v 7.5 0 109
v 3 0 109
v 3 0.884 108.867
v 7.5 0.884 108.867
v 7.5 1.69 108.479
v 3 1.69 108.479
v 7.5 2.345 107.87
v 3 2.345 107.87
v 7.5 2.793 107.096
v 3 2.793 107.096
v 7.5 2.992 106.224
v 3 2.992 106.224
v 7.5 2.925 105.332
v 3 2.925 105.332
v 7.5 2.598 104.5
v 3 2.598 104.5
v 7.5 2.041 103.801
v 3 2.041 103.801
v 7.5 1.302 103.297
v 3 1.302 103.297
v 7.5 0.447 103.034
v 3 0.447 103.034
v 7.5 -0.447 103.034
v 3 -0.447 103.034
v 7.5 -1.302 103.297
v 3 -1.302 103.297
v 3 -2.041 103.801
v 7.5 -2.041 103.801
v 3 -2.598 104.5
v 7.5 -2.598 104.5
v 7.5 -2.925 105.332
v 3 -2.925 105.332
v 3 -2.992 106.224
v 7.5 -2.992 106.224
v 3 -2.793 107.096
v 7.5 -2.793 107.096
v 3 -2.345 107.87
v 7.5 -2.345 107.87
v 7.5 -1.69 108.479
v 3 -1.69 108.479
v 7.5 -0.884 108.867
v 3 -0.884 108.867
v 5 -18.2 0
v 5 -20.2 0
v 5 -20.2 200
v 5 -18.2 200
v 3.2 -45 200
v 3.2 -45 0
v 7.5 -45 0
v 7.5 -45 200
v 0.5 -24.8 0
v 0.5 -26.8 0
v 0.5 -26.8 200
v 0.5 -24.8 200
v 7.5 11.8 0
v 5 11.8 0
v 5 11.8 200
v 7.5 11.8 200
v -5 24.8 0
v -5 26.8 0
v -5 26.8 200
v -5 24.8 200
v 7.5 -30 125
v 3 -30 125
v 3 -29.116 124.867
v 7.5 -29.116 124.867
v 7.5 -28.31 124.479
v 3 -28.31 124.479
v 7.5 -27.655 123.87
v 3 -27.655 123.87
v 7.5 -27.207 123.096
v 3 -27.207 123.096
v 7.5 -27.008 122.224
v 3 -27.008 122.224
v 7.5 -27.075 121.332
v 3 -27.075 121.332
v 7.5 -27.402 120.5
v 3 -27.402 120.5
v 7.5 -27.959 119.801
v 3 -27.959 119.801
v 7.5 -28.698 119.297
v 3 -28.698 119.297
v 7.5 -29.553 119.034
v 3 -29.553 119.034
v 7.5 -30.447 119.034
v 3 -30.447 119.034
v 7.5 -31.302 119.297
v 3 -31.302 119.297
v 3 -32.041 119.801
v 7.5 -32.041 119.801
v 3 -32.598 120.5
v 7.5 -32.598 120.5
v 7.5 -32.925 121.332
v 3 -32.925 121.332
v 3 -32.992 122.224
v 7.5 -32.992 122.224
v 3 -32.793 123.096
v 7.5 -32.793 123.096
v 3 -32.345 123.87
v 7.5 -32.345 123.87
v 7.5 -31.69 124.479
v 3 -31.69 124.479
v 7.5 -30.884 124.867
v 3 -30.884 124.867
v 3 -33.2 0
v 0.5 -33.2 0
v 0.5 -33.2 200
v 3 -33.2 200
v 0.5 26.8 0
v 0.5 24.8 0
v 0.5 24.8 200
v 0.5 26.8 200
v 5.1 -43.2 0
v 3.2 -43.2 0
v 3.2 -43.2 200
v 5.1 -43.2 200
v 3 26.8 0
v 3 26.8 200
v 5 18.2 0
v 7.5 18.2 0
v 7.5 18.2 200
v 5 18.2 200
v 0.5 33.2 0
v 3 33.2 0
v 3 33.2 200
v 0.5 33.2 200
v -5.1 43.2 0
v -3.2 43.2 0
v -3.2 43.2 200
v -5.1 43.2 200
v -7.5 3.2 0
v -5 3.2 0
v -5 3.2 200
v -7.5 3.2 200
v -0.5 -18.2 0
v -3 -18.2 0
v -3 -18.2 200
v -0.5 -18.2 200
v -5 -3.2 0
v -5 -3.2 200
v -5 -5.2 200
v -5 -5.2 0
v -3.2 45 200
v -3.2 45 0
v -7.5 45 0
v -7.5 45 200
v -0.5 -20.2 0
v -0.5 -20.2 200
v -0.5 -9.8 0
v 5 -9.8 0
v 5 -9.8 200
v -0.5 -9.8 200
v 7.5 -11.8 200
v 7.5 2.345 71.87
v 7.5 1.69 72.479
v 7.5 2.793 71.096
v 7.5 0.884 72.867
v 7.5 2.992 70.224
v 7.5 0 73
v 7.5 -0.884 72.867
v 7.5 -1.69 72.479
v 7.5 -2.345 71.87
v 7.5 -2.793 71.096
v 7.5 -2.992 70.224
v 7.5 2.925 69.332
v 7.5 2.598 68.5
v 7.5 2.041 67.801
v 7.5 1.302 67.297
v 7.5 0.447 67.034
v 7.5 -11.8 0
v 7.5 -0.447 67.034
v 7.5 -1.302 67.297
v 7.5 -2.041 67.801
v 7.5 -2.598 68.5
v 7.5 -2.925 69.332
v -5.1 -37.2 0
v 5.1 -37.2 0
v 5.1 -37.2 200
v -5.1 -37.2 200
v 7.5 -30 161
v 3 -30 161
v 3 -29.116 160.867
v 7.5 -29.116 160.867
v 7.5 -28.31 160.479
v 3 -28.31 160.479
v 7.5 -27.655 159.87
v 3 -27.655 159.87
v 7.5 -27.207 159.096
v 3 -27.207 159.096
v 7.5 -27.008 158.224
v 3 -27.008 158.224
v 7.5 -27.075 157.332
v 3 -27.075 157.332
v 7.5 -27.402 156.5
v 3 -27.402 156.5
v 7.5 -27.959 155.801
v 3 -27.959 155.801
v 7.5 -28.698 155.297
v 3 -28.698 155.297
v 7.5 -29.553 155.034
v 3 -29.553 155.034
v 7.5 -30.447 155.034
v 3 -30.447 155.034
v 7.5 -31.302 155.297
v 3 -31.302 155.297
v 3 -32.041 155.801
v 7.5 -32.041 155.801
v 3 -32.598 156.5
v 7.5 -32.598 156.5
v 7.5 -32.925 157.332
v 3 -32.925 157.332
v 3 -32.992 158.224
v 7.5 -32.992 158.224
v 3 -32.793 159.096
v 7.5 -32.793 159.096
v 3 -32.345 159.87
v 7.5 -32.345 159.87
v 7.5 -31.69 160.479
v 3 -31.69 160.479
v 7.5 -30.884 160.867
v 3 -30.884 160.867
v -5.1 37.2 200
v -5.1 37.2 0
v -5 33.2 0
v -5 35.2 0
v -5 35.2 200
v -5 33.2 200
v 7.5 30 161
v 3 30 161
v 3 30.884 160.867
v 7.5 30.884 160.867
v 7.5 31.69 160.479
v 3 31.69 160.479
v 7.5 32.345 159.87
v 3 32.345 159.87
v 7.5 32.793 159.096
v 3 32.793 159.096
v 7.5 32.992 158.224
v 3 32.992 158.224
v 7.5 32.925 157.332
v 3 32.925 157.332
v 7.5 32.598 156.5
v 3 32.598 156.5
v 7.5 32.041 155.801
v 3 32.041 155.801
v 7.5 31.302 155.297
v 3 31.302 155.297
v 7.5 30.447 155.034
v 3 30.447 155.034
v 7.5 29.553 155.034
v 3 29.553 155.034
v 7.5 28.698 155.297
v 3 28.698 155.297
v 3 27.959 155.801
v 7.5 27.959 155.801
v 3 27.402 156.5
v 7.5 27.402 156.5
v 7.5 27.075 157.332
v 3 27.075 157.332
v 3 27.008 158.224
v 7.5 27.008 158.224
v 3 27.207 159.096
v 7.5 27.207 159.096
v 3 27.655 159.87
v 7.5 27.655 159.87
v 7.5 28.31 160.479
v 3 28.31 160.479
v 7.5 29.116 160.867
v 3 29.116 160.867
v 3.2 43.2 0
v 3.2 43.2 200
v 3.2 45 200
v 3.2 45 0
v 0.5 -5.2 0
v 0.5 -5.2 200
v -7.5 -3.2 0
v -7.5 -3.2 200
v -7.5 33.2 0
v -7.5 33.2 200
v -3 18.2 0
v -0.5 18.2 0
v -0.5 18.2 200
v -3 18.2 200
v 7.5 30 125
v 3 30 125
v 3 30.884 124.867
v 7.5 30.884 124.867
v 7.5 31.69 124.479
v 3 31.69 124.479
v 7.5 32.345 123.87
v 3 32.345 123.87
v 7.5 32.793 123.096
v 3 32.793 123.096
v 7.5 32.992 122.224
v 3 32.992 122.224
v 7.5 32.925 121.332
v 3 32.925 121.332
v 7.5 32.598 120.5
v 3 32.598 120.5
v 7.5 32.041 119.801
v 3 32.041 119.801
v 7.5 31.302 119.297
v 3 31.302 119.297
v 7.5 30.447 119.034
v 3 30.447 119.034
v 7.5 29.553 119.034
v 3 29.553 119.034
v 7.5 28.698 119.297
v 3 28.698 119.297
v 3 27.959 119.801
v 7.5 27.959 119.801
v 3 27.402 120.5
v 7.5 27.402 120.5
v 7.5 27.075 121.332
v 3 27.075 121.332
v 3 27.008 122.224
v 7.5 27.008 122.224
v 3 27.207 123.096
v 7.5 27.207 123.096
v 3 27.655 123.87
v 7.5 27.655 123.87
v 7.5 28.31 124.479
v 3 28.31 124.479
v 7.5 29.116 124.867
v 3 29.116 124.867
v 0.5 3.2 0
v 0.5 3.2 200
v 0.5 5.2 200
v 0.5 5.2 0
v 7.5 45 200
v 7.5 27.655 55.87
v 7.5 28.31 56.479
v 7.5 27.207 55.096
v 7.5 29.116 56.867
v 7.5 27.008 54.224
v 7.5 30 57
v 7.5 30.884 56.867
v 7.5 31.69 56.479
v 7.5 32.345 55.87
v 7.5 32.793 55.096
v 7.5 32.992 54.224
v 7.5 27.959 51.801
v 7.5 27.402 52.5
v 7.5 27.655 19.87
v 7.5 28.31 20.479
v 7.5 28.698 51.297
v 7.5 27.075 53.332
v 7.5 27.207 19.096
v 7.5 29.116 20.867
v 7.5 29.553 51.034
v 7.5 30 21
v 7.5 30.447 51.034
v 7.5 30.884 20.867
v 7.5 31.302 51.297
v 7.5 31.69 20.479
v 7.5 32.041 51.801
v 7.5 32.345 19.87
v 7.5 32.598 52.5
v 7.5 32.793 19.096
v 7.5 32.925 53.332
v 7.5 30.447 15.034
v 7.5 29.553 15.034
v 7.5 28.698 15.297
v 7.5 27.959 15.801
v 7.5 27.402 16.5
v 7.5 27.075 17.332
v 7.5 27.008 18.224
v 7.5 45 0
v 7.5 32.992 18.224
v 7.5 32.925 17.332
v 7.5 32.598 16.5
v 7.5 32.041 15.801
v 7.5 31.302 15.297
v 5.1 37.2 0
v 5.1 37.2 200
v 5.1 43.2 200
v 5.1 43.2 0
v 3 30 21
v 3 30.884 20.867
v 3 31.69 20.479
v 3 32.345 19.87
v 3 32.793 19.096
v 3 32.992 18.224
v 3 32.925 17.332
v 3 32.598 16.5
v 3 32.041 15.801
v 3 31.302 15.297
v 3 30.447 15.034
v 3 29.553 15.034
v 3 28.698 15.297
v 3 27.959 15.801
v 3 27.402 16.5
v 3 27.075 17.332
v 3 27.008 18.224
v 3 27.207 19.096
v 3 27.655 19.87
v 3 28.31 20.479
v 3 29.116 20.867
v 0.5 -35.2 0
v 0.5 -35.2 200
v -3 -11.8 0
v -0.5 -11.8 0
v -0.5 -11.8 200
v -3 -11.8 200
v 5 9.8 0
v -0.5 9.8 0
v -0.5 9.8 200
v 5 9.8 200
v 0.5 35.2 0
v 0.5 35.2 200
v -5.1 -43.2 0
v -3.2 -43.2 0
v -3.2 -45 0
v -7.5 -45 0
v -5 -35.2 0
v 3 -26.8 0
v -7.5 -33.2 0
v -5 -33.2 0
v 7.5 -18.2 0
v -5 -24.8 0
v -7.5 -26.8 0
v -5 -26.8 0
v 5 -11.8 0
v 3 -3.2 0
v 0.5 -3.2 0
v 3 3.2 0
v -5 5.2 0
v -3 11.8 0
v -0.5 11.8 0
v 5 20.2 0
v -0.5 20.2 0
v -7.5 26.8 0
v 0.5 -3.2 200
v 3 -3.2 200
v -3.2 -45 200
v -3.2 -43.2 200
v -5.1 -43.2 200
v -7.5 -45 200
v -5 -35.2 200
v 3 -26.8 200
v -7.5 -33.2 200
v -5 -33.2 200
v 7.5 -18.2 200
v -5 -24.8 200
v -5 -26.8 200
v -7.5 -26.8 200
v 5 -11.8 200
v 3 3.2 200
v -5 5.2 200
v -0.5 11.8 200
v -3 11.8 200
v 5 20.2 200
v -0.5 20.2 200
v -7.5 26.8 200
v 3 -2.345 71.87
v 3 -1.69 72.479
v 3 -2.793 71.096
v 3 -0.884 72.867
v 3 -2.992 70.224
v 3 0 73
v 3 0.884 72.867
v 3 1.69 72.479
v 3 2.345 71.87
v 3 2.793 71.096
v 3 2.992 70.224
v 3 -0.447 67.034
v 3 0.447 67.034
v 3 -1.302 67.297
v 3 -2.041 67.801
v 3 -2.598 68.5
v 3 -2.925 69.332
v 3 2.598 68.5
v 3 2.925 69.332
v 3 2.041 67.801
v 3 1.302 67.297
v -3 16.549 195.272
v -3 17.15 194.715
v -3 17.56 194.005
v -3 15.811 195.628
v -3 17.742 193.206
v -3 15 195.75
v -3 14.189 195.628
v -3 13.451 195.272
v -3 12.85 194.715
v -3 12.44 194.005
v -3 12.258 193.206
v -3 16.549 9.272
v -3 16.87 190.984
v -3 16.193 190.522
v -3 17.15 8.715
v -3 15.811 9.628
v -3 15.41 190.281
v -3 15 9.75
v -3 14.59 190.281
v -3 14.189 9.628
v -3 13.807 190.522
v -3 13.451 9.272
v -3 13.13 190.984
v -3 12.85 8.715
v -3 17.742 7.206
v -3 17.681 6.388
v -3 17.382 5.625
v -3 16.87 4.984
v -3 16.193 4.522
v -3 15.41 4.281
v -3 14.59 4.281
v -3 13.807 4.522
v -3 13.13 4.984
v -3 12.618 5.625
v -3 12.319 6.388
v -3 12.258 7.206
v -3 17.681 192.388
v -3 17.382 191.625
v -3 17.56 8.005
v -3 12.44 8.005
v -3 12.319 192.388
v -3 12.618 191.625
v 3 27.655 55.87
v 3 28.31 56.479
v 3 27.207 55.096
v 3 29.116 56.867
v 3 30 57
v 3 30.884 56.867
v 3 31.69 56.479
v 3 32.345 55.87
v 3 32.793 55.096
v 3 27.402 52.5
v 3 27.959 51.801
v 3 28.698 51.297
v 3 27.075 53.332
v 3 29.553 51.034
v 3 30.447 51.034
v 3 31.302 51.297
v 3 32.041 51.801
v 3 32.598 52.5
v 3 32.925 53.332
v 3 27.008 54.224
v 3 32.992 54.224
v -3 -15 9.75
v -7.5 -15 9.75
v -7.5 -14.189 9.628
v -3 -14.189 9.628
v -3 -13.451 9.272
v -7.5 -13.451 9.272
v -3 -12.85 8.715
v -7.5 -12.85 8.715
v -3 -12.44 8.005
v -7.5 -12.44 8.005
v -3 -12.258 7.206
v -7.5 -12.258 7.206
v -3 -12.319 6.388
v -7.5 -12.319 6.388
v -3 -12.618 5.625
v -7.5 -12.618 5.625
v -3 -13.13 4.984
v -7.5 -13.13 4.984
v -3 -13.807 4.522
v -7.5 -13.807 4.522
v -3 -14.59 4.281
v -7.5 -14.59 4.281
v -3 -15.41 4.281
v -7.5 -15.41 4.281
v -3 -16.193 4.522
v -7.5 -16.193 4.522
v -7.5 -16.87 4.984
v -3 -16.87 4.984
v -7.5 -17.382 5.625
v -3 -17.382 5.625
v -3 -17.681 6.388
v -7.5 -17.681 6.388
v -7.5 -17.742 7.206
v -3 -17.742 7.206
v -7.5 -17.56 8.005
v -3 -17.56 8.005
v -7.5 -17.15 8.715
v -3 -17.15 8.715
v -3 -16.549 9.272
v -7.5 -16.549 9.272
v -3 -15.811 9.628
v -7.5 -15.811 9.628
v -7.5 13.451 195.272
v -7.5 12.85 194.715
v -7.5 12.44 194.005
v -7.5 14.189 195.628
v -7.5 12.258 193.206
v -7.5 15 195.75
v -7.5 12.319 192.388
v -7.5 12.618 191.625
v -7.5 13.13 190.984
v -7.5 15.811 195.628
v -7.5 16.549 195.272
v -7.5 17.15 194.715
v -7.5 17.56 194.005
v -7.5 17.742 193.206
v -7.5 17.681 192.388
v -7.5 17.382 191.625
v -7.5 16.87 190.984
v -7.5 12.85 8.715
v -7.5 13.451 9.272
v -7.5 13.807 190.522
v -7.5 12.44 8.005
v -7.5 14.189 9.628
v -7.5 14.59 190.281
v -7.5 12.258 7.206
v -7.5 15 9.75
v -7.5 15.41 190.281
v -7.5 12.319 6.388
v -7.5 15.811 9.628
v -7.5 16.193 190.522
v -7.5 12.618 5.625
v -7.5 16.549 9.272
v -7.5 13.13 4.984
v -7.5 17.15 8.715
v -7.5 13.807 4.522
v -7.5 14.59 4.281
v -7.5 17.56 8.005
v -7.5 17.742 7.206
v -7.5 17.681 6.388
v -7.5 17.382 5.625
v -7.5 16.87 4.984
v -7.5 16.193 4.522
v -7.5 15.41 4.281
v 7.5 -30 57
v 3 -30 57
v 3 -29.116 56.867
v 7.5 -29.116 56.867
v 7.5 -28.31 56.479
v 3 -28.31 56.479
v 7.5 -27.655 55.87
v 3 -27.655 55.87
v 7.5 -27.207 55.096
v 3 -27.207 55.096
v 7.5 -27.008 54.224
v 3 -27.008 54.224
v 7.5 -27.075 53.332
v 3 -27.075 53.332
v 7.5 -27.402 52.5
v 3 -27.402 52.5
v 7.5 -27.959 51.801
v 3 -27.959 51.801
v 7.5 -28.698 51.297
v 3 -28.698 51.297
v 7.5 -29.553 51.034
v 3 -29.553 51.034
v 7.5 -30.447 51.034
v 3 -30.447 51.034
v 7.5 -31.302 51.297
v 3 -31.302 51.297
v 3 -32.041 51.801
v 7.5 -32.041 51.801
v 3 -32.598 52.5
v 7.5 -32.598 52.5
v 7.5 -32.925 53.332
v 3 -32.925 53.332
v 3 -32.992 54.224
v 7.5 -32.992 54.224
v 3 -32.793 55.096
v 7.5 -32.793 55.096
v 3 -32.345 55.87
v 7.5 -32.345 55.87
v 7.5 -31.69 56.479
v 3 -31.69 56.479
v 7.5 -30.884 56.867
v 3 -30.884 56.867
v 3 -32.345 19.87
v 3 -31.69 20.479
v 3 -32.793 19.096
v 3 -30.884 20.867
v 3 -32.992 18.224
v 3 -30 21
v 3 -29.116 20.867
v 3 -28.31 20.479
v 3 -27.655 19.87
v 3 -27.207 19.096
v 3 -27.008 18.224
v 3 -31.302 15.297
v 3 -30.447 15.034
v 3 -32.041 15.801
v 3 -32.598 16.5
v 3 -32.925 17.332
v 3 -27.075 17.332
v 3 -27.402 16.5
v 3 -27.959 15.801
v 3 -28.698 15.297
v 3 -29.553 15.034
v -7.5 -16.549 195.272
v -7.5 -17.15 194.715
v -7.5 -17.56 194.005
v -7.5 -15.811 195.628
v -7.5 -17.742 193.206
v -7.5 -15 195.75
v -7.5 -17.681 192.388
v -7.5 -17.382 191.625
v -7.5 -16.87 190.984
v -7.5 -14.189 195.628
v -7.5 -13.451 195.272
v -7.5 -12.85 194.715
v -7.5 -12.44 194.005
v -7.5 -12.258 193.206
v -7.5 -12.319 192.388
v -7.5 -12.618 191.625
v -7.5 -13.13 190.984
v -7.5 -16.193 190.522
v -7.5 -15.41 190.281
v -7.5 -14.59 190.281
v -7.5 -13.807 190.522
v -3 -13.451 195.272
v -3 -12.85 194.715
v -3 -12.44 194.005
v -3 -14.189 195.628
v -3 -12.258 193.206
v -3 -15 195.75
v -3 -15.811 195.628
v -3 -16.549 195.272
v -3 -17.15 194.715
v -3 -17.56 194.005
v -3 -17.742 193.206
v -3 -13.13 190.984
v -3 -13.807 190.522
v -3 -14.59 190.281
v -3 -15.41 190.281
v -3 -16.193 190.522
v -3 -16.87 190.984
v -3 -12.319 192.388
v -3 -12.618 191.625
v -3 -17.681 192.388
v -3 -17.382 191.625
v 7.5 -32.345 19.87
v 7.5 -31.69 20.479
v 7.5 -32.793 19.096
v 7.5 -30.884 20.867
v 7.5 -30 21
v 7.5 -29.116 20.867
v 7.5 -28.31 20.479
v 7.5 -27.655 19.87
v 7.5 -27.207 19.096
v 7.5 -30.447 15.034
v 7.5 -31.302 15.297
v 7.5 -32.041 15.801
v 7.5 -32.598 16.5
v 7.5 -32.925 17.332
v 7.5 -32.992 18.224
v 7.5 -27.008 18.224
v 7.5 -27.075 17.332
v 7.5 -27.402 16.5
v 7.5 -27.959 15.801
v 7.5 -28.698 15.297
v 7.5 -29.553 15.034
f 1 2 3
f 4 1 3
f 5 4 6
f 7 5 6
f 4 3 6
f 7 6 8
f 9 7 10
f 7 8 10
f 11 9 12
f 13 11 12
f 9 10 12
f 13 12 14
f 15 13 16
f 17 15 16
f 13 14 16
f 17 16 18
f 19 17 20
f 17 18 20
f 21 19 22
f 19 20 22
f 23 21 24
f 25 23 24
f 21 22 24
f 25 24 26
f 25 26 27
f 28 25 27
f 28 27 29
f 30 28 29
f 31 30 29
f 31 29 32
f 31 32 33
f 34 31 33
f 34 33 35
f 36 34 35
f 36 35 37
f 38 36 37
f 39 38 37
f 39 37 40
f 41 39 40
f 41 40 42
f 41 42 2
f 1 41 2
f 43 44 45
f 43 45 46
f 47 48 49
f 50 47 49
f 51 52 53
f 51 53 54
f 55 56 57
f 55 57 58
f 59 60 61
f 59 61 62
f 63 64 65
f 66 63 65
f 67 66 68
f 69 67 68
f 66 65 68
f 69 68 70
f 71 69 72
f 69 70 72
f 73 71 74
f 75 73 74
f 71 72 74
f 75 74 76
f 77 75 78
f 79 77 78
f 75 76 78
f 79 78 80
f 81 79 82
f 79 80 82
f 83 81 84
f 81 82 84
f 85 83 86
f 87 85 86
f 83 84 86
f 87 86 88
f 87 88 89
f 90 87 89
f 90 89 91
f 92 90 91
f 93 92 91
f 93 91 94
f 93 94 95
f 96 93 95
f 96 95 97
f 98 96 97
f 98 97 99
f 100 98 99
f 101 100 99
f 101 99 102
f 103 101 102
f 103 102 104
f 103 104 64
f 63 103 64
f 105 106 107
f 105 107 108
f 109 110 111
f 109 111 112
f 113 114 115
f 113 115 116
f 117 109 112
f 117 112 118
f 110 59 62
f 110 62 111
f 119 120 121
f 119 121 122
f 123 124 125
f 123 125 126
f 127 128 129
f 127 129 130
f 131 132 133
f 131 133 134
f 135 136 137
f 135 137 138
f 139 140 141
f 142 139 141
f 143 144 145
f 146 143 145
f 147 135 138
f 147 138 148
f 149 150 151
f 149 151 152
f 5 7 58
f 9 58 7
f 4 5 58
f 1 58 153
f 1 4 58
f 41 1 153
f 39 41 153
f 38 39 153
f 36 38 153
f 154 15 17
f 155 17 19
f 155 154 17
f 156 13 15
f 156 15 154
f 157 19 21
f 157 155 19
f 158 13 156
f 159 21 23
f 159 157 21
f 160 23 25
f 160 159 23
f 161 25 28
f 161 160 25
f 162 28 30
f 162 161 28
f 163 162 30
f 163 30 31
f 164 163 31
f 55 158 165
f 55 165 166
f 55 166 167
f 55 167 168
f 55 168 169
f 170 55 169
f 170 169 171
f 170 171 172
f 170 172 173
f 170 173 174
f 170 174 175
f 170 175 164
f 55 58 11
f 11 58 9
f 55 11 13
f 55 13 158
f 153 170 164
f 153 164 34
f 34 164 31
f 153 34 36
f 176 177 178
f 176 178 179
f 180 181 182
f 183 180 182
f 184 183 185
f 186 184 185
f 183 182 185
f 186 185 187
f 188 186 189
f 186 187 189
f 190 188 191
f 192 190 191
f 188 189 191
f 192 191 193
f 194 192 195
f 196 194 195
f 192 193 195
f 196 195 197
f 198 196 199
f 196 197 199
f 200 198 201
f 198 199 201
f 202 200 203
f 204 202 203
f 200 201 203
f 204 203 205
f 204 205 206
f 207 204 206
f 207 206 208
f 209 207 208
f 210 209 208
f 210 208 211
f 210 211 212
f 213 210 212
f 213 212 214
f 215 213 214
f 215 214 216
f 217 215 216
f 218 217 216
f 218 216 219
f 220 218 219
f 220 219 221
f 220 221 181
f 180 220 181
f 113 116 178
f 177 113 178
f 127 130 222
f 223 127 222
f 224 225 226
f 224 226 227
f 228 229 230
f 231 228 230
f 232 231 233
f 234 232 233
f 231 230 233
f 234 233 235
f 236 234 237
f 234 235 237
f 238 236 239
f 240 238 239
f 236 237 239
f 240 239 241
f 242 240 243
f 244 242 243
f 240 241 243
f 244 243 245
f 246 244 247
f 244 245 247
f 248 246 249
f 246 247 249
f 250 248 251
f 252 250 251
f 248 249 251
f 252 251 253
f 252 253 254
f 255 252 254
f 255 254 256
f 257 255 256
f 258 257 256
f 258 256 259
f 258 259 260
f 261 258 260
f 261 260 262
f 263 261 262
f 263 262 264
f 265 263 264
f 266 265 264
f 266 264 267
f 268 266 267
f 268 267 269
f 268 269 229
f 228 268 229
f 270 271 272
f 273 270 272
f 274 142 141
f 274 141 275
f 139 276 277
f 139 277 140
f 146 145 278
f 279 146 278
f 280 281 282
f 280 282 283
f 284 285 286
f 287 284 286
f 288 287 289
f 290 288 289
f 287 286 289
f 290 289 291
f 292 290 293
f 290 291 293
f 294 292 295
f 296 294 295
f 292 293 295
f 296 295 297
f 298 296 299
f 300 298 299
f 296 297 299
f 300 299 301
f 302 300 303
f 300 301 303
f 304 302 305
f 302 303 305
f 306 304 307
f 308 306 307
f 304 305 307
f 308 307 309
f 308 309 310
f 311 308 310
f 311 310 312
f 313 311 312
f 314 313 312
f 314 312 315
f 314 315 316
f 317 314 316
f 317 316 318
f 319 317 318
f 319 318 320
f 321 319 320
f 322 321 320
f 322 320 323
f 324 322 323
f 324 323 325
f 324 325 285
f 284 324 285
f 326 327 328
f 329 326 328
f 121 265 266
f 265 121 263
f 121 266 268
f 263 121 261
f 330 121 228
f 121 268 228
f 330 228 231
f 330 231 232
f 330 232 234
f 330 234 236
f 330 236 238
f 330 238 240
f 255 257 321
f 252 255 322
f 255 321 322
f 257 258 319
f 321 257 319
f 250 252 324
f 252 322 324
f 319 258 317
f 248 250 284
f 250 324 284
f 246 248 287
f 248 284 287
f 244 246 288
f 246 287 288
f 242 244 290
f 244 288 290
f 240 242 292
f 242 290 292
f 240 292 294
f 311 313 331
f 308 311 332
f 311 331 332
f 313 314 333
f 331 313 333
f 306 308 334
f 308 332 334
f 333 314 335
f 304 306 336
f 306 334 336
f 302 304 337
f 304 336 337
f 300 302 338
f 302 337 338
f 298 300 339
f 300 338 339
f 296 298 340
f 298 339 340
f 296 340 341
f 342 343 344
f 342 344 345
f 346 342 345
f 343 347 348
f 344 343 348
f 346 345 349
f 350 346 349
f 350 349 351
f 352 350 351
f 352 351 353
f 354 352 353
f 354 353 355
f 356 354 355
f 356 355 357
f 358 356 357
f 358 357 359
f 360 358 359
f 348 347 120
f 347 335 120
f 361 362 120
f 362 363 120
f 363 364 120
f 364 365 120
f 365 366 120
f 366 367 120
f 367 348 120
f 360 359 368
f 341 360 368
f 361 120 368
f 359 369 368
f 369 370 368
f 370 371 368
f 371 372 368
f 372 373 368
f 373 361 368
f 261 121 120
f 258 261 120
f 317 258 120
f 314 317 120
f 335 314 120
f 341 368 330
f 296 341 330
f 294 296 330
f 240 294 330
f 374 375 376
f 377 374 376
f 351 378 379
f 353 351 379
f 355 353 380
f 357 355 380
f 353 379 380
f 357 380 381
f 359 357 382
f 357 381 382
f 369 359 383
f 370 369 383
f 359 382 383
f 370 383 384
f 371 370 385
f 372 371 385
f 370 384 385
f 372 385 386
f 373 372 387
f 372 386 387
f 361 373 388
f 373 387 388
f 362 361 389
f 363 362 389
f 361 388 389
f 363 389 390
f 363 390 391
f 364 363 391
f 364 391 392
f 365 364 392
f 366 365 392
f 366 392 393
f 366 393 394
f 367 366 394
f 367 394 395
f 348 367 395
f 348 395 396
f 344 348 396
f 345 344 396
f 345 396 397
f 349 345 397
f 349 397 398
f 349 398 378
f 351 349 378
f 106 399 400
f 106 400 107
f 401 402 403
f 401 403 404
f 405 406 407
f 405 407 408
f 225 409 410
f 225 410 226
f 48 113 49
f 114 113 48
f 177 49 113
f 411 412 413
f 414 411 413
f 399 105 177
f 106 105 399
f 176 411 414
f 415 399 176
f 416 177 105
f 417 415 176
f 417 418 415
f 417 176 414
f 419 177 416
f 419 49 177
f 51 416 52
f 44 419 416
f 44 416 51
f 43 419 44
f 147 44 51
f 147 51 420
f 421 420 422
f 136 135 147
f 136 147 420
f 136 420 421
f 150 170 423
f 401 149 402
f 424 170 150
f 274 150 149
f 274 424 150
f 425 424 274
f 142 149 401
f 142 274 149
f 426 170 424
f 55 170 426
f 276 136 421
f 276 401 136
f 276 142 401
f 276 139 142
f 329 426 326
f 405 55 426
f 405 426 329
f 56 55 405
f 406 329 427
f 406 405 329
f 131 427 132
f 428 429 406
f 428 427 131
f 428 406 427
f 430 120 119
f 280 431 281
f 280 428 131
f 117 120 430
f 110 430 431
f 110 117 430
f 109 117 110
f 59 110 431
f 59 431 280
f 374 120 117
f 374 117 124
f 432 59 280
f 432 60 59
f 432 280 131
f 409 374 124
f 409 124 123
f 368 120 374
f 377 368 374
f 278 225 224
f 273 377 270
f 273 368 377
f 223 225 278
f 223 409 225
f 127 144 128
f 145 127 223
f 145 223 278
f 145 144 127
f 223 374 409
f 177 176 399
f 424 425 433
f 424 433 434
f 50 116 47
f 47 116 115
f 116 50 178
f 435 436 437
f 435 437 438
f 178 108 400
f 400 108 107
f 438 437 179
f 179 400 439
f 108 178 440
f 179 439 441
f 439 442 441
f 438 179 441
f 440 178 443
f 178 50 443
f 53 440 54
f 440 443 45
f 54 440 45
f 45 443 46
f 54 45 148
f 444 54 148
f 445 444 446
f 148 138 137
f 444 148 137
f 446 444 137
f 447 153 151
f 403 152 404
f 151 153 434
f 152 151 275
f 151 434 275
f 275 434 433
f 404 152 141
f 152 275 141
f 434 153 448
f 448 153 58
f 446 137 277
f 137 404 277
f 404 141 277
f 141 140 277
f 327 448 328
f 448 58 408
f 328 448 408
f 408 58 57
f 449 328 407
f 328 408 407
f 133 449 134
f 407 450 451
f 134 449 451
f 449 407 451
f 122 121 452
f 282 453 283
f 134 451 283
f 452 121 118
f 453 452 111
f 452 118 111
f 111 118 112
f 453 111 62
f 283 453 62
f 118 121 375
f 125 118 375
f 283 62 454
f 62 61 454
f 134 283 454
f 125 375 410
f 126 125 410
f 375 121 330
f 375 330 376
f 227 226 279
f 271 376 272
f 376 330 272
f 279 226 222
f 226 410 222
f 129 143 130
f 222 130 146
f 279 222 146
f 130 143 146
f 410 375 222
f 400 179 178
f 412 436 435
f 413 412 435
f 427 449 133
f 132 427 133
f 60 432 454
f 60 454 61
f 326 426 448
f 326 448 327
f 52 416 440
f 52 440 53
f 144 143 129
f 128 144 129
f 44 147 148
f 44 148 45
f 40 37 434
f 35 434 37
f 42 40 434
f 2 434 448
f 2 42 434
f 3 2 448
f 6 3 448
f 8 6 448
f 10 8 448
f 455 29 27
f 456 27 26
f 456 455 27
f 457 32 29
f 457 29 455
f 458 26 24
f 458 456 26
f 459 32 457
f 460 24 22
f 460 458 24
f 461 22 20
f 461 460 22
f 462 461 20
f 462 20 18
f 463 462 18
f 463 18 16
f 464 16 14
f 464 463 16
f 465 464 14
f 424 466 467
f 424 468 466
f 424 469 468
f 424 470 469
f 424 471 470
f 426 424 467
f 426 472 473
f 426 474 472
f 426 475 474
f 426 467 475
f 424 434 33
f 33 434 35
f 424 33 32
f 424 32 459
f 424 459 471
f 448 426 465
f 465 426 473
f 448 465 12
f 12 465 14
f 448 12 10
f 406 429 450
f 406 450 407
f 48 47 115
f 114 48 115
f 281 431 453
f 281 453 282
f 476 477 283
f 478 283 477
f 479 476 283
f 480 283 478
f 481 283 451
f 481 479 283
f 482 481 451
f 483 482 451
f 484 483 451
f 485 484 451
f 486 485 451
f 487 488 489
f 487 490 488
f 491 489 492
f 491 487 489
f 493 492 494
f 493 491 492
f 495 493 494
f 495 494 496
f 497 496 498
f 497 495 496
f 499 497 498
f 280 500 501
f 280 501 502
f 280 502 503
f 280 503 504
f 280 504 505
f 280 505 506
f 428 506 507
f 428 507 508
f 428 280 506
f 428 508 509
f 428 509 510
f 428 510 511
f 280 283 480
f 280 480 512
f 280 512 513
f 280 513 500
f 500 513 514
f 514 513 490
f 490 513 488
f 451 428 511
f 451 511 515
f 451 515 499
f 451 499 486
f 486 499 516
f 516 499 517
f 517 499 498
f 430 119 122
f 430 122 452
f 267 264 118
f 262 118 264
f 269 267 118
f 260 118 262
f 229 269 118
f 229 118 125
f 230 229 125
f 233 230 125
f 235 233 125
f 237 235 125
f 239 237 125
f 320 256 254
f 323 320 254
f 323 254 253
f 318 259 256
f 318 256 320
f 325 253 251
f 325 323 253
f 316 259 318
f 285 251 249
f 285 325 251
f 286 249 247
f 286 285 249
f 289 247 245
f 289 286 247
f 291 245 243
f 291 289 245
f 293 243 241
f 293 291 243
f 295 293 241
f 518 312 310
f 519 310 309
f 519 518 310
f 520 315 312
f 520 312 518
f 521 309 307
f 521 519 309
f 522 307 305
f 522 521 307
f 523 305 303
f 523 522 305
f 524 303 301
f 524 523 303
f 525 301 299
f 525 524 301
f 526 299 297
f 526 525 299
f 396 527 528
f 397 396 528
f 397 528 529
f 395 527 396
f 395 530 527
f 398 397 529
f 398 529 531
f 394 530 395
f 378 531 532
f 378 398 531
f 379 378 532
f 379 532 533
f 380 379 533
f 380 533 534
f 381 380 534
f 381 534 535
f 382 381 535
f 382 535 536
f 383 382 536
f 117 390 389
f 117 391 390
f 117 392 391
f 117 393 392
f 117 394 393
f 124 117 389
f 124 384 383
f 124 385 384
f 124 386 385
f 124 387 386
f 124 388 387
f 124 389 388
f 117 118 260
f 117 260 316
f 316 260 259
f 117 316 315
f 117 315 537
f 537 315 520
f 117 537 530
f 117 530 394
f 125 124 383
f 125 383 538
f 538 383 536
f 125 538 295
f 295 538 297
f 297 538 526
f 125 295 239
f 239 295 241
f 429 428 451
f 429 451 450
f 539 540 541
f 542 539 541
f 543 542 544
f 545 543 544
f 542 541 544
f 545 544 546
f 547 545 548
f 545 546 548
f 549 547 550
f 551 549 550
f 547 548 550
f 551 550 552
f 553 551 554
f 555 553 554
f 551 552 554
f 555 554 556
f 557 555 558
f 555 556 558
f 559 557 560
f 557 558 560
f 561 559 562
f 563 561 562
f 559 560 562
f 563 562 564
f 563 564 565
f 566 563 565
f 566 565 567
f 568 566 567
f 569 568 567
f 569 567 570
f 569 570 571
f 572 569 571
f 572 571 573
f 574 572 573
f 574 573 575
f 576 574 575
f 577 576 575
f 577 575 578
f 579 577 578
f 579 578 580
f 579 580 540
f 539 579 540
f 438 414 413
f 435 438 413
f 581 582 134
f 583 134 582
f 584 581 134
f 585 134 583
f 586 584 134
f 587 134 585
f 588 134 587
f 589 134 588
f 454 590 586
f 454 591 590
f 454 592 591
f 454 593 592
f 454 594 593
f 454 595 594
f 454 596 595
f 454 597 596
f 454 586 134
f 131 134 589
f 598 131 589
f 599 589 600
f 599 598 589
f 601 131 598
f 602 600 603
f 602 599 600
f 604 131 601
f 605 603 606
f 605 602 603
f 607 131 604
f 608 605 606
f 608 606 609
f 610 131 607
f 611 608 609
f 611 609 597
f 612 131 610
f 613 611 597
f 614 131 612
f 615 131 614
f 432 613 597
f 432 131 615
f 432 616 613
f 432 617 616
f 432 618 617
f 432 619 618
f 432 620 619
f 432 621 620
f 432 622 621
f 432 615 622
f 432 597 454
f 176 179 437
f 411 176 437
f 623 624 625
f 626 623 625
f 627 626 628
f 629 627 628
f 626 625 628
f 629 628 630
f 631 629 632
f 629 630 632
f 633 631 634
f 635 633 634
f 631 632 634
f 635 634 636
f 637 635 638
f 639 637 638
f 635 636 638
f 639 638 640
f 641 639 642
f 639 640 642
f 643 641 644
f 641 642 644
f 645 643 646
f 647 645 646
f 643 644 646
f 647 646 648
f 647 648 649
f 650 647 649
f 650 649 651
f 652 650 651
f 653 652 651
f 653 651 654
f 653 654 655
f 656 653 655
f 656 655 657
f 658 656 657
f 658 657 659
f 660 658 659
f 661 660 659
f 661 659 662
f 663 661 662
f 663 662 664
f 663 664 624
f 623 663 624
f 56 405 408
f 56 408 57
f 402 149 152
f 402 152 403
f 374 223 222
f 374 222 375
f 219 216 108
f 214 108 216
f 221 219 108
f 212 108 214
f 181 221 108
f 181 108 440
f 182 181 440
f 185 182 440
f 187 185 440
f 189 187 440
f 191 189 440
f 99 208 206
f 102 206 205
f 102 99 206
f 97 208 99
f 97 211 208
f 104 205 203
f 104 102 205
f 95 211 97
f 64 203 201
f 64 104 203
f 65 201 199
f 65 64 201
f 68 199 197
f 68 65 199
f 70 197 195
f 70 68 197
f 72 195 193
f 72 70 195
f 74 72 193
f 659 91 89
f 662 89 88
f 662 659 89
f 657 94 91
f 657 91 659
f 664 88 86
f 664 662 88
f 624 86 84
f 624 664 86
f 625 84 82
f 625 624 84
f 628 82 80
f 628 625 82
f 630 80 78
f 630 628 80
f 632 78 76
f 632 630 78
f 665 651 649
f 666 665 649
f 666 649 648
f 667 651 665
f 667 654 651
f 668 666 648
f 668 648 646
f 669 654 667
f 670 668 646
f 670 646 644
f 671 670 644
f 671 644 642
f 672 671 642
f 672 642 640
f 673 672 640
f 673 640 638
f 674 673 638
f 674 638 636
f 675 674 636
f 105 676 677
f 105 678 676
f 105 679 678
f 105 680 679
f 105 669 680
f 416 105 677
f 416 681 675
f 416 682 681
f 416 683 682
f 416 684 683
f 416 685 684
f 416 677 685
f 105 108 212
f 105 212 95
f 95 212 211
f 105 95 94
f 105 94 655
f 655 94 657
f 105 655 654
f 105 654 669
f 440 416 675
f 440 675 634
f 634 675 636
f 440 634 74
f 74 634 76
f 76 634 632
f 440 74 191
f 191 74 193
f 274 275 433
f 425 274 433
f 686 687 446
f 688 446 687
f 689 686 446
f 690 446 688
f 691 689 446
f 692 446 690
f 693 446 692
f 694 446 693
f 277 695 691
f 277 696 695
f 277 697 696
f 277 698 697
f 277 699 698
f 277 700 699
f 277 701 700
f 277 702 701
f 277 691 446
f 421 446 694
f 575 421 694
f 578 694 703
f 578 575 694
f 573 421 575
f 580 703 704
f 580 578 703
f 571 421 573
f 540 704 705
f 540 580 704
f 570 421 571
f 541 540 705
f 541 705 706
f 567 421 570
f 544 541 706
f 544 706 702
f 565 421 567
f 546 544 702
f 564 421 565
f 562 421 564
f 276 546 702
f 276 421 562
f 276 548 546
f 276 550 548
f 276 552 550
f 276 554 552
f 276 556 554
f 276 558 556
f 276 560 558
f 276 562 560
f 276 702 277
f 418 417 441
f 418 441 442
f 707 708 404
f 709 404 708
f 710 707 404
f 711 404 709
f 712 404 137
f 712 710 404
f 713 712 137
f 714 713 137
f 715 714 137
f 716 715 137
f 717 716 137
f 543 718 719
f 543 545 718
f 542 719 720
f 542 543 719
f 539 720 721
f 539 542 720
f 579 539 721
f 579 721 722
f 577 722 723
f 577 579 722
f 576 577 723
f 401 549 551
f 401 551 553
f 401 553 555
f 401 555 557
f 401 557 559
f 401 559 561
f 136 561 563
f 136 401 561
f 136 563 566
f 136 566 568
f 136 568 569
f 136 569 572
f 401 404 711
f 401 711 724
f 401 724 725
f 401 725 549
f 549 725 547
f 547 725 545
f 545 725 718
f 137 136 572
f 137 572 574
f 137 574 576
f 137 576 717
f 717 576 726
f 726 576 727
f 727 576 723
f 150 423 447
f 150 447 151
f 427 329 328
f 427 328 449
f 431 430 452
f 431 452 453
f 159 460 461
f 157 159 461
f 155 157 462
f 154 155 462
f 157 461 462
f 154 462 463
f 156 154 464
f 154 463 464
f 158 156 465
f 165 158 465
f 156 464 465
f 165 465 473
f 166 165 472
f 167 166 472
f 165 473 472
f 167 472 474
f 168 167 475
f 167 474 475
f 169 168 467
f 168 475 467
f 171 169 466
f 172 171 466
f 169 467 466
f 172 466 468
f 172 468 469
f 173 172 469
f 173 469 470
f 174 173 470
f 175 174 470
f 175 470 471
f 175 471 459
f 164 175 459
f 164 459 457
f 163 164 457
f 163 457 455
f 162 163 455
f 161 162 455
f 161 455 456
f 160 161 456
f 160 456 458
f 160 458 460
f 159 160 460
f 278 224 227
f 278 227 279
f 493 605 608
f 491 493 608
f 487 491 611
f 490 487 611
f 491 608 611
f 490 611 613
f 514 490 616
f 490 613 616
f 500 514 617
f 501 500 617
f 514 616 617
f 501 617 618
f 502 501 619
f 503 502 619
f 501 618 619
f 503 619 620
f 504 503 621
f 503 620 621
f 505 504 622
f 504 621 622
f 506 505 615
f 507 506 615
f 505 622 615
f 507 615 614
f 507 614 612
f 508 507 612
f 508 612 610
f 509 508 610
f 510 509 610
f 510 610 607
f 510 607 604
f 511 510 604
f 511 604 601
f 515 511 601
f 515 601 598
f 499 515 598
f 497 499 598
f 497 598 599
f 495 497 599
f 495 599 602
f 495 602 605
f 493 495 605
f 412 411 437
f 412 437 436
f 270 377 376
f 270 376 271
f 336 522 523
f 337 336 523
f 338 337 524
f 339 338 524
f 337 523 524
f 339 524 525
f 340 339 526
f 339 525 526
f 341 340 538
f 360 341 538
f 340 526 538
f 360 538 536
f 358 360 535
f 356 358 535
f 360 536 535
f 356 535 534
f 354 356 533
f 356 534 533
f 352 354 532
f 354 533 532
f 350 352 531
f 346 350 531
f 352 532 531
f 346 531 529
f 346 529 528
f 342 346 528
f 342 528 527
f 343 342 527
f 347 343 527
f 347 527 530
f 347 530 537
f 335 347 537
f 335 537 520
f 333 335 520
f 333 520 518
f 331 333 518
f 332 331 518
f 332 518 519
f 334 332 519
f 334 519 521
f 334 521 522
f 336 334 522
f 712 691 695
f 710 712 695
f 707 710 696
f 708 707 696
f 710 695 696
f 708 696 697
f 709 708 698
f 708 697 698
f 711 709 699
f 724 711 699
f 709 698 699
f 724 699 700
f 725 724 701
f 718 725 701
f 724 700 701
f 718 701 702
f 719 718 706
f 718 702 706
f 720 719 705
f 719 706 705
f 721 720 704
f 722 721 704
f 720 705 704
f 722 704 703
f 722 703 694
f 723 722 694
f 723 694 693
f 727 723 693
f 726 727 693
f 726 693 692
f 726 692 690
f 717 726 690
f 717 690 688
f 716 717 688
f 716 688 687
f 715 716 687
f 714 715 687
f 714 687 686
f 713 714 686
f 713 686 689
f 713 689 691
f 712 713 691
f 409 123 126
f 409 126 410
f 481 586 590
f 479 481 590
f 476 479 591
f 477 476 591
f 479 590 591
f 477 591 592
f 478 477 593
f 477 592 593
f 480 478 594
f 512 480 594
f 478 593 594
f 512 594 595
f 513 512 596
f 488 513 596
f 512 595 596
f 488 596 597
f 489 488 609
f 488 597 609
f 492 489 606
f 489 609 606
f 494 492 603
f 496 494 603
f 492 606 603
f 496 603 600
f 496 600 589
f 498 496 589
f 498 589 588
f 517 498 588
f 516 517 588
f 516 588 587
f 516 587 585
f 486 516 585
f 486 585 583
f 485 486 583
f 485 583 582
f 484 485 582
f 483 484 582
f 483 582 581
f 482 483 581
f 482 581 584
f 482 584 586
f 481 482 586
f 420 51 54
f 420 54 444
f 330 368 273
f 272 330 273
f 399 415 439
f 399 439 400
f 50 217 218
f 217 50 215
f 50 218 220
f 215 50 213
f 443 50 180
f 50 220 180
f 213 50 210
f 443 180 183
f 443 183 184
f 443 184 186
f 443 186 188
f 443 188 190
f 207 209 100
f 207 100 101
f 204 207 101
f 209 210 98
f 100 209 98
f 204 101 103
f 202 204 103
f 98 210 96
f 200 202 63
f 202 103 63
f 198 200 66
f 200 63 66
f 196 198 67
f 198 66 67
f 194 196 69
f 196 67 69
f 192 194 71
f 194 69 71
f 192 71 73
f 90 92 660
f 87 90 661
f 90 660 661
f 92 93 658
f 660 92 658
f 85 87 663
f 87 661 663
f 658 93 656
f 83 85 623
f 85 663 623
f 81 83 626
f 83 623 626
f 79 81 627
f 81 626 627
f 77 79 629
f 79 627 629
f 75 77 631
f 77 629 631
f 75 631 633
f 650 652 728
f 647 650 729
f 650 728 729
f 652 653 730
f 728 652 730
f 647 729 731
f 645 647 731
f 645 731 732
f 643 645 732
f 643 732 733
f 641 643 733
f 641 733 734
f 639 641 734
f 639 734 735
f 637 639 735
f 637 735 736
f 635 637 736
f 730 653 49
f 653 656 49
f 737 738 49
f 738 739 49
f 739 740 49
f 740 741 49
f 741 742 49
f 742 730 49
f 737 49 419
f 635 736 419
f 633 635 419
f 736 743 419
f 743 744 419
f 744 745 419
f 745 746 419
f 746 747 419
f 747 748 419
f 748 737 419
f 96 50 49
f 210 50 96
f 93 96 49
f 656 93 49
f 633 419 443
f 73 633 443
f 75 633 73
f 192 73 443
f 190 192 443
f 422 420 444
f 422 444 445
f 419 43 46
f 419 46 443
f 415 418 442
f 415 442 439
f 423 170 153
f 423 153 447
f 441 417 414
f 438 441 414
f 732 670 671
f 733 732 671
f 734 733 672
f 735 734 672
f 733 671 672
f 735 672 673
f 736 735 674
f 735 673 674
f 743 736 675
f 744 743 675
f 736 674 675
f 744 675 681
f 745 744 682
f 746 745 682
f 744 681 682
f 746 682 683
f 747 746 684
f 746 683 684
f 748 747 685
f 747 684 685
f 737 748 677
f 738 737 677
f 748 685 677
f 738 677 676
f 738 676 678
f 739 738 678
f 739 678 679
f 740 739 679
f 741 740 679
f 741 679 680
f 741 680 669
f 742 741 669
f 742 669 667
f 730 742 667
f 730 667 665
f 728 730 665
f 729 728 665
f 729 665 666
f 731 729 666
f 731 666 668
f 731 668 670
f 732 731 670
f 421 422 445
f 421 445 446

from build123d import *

# Parameters (mm, degrees)
EXTRUDE_1_DEPTH         = 200
HOLE_WIZARD_6_0_6_6_D   = 6
HOLE_WIZARD_5_5_5_5_1_D = 5.5


with BuildPart() as part:
    # Sketch1 → 凸台-拉伸1 (new body)
    with BuildSketch(Plane.XY):
        Polygon((-6.5, 45), (-3.2, 45), (-3.2, 43.2), (-5.1, 43.2), (-5.1, 37.2), (5.1, 37.2), (5.1, 43.2), (3.2, 43.2), (3.2, 45), (6.5, 45), (7.5, 45), (7.5, 44), (7.5, 18.2), (5, 18.2), (5, 20.2), (-0.5, 20.2), (-0.5, 18.2), (-3, 18.2), (-3, 11.8), (-0.5, 11.8), (-0.5, 9.8), (5, 9.8), (5, 11.8), (7.5, 11.8), (7.5, -11.8), (5, -11.8), (5, -9.8), (-0.5, -9.8), (-0.5, -11.8), (-3, -11.8), (-3, -18.2), (-0.5, -18.2), (-0.5, -20.2), (5, -20.2), (5, -18.2), (7.5, -18.2), (7.5, -44), (7.5, -45), (6.5, -45), (3.2, -45), (3.2, -43.2), (5.1, -43.2), (5.1, -37.2), (-5.1, -37.2), (-5.1, -43.2), (-3.2, -43.2), (-3.2, -45), (-6.496721962, -45), (-7.5, -45), (-7.5, -44), (-7.5, -33.2), (-5, -33.2), (-5, -35.2), (0.5, -35.2), (0.5, -33.2), (3, -33.2), (3, -26.8), (0.5, -26.8), (0.5, -24.8), (-5, -24.8), (-5, -26.8), (-7.5, -26.8), (-7.5, -3.2), (-5, -3.2), (-5, -5.2), (0.5, -5.2), (0.5, -3.2), (3, -3.2), (3, 3.2), (0.5, 3.2), (0.5, 5.2), (-5, 5.2), (-5, 3.2), (-7.5, 3.2), (-7.5, 26.8), (-5, 26.8), (-5, 24.8), (0.5, 24.8), (0.5, 26.8), (3, 26.8), (3, 33.2), (0.5, 33.2), (0.5, 35.2), (-5, 35.2), (-5, 33.2), (-7.5, 33.2), (-7.5, 44), (-7.5, 45), align=None)
    extrude(amount=EXTRUDE_1_DEPTH)

    # Ø6.0 (6) 直径孔6 (through all)
    with Locations(Plane(origin=(7.5, 0, 0), x_dir=(0, 0, -1), z_dir=(1, 0, 0))):
        with Locations((-158, -30), (-158, 30), (-122, -30), (-122, 30), (-54, 30), (-54, -30), (-18, -30), (-18, 30), (-106, 0), (-70, 0)):
            Hole(HOLE_WIZARD_6_0_6_6_D / 2)

    # Ø5.5 (5.5) 直径孔1 (through all)
    with Locations(Plane(origin=(-3, 0, 0), x_dir=(0, 0, -1), z_dir=(1, 0, 0))):
        with Locations((-193, -15), (-193, 15), (-7, -15), (-7, 15)):
            Hole(HOLE_WIZARD_5_5_5_5_1_D / 2)


solid = part.part
